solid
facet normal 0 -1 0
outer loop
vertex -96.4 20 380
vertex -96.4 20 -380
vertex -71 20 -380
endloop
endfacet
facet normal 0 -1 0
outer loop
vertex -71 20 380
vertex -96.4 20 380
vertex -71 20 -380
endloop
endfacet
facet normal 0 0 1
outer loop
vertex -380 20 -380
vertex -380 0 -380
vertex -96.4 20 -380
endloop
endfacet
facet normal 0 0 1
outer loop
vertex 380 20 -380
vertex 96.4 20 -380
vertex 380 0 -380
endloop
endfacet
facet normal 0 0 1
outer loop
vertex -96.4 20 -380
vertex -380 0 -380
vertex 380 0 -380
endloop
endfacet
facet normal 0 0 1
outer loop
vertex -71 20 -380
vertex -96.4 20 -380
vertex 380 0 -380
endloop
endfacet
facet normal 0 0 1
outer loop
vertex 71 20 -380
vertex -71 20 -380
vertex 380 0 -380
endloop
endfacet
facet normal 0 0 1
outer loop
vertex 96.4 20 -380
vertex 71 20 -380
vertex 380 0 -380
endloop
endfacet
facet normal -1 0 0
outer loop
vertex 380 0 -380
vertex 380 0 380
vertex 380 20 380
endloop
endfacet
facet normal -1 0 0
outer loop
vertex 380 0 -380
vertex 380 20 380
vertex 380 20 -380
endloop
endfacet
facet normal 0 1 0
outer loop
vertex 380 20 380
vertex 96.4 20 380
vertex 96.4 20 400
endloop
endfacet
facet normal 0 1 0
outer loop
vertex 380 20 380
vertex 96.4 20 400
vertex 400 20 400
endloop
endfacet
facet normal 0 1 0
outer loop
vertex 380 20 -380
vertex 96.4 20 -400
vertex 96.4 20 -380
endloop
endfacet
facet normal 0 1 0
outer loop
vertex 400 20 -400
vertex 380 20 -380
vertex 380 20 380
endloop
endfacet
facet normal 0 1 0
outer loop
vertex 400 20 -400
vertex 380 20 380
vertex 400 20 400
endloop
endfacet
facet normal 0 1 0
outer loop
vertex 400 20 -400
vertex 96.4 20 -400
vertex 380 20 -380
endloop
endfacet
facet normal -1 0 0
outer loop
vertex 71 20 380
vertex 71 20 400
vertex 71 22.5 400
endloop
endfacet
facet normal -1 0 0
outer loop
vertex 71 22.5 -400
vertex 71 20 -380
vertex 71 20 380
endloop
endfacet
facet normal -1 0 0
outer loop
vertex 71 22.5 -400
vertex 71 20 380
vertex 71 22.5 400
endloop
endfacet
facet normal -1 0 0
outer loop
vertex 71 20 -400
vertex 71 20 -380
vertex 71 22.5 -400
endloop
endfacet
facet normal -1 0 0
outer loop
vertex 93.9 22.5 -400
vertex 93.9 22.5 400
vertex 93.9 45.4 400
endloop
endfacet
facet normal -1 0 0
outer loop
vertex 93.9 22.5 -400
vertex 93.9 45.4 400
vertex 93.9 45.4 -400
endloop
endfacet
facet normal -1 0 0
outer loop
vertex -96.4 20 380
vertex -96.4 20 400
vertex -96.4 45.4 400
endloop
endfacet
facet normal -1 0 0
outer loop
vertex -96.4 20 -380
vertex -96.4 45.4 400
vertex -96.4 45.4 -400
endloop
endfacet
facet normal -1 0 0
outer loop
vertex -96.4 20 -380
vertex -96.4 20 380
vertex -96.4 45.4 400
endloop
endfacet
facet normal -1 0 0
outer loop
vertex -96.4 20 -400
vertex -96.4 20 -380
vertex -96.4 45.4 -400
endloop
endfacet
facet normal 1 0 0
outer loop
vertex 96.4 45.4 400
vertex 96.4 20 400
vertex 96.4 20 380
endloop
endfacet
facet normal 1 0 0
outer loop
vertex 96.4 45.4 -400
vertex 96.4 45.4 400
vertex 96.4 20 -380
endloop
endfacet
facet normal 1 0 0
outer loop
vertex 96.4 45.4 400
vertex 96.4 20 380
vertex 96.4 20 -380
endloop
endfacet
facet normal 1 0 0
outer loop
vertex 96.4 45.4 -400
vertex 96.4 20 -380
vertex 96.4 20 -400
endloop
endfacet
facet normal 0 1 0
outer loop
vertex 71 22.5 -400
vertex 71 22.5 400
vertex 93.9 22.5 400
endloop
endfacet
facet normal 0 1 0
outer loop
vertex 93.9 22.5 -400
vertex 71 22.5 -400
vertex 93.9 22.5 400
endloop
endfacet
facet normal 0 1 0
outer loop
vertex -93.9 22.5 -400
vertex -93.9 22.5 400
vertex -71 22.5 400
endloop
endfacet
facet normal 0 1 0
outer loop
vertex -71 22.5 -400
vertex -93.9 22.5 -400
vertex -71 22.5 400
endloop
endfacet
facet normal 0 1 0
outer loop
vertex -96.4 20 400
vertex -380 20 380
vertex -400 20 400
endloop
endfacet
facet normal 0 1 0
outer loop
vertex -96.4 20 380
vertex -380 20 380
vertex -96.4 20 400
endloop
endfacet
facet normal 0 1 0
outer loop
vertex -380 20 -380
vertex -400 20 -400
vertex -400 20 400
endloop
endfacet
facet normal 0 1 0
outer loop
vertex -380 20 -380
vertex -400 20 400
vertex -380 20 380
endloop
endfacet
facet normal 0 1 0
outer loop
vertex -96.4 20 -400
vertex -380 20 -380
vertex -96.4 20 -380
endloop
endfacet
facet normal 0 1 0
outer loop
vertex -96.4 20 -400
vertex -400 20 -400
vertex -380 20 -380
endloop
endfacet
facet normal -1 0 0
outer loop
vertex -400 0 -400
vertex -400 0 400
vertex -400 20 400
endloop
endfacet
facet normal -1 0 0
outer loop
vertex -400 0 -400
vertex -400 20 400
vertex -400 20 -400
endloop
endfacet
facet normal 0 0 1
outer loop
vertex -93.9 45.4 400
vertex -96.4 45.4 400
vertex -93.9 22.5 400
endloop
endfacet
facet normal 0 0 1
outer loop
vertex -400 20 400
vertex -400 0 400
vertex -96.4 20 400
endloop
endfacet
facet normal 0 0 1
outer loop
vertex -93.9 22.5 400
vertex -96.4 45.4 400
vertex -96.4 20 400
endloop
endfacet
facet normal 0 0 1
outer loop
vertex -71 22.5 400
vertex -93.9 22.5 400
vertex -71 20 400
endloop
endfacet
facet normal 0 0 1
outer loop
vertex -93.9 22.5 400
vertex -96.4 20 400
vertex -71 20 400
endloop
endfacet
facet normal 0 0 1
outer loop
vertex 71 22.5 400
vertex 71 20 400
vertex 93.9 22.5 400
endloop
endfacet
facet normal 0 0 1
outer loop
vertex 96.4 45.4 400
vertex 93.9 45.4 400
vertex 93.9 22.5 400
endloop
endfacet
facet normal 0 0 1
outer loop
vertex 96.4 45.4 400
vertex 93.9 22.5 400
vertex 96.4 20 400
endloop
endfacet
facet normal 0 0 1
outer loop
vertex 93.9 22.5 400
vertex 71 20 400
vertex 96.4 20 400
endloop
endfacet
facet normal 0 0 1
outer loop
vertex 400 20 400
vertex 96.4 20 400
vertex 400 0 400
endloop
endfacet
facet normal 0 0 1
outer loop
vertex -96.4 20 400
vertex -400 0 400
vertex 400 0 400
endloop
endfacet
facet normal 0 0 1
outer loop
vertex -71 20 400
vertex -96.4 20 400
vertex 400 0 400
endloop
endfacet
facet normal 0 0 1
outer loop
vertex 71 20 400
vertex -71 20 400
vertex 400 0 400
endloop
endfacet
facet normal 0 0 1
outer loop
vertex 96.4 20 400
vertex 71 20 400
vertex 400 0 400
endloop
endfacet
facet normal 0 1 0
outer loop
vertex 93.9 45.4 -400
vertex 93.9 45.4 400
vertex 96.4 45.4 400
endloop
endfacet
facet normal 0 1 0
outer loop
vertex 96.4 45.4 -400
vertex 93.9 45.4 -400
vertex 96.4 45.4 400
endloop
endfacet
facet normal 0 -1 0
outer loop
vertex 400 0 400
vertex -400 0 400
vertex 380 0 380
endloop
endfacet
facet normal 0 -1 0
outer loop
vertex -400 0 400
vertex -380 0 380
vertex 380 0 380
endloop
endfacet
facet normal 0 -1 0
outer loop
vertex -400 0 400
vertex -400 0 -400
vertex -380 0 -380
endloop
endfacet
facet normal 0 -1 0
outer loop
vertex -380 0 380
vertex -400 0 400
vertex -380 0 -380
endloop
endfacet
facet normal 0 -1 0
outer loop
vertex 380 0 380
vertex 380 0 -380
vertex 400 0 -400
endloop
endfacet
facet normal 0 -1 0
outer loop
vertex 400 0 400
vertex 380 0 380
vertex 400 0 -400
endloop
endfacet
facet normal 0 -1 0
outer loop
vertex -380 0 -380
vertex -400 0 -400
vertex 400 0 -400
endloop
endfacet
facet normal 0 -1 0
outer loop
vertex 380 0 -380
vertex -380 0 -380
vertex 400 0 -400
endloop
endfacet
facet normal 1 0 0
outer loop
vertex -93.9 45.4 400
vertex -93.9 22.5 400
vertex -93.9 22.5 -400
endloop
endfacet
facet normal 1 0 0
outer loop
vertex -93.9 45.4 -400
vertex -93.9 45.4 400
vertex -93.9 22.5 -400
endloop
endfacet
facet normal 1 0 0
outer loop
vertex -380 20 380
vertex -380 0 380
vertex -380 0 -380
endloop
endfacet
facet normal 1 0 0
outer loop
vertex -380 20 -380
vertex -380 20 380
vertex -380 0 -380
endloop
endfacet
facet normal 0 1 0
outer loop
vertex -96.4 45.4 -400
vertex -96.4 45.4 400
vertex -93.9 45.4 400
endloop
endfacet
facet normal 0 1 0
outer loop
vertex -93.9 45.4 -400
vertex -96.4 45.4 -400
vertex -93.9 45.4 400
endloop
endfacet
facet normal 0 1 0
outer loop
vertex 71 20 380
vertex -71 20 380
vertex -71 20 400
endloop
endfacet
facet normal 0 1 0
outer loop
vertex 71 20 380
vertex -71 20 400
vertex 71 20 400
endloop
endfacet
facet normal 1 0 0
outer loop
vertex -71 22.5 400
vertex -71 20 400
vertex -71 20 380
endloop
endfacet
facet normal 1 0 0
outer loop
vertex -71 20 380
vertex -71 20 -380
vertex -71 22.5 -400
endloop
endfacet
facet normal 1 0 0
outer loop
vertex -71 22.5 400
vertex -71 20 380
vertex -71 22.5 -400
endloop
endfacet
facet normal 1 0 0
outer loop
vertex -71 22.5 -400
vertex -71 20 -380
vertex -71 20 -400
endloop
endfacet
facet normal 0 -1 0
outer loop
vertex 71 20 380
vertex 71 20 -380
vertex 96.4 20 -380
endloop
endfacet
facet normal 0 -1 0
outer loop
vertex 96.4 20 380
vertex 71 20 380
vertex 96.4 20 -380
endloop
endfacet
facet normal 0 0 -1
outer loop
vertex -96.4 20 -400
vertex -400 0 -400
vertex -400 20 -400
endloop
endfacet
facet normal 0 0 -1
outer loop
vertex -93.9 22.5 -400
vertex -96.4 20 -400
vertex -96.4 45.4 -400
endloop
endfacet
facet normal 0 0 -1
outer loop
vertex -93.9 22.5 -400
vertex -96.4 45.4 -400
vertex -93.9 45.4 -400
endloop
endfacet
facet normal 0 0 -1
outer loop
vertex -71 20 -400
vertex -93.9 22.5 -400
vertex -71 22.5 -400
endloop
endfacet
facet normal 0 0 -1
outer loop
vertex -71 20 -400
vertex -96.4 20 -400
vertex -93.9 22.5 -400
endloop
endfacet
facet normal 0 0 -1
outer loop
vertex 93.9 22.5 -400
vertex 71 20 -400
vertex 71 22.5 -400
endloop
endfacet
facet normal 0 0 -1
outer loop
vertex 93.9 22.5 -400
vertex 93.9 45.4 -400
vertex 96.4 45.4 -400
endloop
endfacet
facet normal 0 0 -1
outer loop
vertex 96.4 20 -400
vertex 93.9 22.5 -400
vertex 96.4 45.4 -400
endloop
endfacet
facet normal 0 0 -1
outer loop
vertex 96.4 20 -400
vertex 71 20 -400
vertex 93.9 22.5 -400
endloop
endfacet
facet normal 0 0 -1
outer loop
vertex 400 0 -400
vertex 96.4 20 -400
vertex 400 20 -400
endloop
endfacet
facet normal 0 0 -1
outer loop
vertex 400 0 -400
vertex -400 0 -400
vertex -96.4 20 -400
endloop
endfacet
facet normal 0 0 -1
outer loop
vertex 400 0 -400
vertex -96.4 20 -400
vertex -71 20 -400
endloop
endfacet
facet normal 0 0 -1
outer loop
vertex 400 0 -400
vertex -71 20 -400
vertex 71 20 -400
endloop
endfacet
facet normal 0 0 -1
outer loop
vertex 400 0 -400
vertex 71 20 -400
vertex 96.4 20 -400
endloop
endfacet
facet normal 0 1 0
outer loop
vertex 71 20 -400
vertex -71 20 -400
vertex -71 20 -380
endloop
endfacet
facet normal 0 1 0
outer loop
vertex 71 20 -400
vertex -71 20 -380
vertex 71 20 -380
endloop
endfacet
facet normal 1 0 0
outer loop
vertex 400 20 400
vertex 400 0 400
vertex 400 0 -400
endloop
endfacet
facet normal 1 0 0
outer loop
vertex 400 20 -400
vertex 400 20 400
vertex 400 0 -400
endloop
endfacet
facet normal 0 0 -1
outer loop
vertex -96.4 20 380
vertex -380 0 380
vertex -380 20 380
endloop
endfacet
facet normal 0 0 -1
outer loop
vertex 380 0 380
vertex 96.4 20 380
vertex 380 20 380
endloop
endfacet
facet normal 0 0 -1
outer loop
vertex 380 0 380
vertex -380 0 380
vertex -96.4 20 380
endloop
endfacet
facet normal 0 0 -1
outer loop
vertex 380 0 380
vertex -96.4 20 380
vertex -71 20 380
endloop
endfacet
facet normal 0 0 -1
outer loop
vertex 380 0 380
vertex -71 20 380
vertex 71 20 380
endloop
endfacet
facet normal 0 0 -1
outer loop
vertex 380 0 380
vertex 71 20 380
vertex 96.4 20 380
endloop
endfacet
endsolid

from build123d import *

# Parameters (mm, degrees)
SKETCH1_W           = 800
SKETCH1_H           = 800
SKETCH1_W_2         = 760
SKETCH1_H_2         = 760
BOSS_EXTRUDE1_DEPTH = 20
SKETCH2_W           = 25.4
SKETCH2_H           = 800
BOSS_EXTRUDE2_DEPTH = 2.5
SKETCH3_W           = 2.5
SKETCH3_H           = 800
BOSS_EXTRUDE3_DEPTH = 22.9


with BuildPart() as part:
    # Sketch1 → Boss-Extrude1 (new body)
    with BuildSketch(Plane(origin=(0, 0, 0), x_dir=(1, 0, 0), z_dir=(0, 1, 0))):
        Rectangle(SKETCH1_W, SKETCH1_H)
        Rectangle(SKETCH1_W_2, SKETCH1_H_2, mode=Mode.SUBTRACT)
    extrude(amount=BOSS_EXTRUDE1_DEPTH)

    # Sketch2 → Boss-Extrude2 (add)
    with BuildSketch(Plane(origin=(0, 20, 0), x_dir=(1, 0, 0), z_dir=(0, 1, 0))):
        with Locations((83.7, 0)):
            Rectangle(SKETCH2_W, SKETCH2_H)
        with Locations((-83.7, 0)):
            Rectangle(SKETCH2_W, SKETCH2_H)
    extrude(amount=BOSS_EXTRUDE2_DEPTH)

    # Sketch3 → Boss-Extrude3 (add)
    with BuildSketch(Plane(origin=(0, 22.5, 0), x_dir=(1, 0, 0), z_dir=(0, 1, 0))):
        with Locations((-95.15, 0)):
            Rectangle(SKETCH3_W, SKETCH3_H)
        with Locations((95.15, 0)):
            Rectangle(SKETCH3_W, SKETCH3_H)
    extrude(amount=BOSS_EXTRUDE3_DEPTH)


solid = part.part
